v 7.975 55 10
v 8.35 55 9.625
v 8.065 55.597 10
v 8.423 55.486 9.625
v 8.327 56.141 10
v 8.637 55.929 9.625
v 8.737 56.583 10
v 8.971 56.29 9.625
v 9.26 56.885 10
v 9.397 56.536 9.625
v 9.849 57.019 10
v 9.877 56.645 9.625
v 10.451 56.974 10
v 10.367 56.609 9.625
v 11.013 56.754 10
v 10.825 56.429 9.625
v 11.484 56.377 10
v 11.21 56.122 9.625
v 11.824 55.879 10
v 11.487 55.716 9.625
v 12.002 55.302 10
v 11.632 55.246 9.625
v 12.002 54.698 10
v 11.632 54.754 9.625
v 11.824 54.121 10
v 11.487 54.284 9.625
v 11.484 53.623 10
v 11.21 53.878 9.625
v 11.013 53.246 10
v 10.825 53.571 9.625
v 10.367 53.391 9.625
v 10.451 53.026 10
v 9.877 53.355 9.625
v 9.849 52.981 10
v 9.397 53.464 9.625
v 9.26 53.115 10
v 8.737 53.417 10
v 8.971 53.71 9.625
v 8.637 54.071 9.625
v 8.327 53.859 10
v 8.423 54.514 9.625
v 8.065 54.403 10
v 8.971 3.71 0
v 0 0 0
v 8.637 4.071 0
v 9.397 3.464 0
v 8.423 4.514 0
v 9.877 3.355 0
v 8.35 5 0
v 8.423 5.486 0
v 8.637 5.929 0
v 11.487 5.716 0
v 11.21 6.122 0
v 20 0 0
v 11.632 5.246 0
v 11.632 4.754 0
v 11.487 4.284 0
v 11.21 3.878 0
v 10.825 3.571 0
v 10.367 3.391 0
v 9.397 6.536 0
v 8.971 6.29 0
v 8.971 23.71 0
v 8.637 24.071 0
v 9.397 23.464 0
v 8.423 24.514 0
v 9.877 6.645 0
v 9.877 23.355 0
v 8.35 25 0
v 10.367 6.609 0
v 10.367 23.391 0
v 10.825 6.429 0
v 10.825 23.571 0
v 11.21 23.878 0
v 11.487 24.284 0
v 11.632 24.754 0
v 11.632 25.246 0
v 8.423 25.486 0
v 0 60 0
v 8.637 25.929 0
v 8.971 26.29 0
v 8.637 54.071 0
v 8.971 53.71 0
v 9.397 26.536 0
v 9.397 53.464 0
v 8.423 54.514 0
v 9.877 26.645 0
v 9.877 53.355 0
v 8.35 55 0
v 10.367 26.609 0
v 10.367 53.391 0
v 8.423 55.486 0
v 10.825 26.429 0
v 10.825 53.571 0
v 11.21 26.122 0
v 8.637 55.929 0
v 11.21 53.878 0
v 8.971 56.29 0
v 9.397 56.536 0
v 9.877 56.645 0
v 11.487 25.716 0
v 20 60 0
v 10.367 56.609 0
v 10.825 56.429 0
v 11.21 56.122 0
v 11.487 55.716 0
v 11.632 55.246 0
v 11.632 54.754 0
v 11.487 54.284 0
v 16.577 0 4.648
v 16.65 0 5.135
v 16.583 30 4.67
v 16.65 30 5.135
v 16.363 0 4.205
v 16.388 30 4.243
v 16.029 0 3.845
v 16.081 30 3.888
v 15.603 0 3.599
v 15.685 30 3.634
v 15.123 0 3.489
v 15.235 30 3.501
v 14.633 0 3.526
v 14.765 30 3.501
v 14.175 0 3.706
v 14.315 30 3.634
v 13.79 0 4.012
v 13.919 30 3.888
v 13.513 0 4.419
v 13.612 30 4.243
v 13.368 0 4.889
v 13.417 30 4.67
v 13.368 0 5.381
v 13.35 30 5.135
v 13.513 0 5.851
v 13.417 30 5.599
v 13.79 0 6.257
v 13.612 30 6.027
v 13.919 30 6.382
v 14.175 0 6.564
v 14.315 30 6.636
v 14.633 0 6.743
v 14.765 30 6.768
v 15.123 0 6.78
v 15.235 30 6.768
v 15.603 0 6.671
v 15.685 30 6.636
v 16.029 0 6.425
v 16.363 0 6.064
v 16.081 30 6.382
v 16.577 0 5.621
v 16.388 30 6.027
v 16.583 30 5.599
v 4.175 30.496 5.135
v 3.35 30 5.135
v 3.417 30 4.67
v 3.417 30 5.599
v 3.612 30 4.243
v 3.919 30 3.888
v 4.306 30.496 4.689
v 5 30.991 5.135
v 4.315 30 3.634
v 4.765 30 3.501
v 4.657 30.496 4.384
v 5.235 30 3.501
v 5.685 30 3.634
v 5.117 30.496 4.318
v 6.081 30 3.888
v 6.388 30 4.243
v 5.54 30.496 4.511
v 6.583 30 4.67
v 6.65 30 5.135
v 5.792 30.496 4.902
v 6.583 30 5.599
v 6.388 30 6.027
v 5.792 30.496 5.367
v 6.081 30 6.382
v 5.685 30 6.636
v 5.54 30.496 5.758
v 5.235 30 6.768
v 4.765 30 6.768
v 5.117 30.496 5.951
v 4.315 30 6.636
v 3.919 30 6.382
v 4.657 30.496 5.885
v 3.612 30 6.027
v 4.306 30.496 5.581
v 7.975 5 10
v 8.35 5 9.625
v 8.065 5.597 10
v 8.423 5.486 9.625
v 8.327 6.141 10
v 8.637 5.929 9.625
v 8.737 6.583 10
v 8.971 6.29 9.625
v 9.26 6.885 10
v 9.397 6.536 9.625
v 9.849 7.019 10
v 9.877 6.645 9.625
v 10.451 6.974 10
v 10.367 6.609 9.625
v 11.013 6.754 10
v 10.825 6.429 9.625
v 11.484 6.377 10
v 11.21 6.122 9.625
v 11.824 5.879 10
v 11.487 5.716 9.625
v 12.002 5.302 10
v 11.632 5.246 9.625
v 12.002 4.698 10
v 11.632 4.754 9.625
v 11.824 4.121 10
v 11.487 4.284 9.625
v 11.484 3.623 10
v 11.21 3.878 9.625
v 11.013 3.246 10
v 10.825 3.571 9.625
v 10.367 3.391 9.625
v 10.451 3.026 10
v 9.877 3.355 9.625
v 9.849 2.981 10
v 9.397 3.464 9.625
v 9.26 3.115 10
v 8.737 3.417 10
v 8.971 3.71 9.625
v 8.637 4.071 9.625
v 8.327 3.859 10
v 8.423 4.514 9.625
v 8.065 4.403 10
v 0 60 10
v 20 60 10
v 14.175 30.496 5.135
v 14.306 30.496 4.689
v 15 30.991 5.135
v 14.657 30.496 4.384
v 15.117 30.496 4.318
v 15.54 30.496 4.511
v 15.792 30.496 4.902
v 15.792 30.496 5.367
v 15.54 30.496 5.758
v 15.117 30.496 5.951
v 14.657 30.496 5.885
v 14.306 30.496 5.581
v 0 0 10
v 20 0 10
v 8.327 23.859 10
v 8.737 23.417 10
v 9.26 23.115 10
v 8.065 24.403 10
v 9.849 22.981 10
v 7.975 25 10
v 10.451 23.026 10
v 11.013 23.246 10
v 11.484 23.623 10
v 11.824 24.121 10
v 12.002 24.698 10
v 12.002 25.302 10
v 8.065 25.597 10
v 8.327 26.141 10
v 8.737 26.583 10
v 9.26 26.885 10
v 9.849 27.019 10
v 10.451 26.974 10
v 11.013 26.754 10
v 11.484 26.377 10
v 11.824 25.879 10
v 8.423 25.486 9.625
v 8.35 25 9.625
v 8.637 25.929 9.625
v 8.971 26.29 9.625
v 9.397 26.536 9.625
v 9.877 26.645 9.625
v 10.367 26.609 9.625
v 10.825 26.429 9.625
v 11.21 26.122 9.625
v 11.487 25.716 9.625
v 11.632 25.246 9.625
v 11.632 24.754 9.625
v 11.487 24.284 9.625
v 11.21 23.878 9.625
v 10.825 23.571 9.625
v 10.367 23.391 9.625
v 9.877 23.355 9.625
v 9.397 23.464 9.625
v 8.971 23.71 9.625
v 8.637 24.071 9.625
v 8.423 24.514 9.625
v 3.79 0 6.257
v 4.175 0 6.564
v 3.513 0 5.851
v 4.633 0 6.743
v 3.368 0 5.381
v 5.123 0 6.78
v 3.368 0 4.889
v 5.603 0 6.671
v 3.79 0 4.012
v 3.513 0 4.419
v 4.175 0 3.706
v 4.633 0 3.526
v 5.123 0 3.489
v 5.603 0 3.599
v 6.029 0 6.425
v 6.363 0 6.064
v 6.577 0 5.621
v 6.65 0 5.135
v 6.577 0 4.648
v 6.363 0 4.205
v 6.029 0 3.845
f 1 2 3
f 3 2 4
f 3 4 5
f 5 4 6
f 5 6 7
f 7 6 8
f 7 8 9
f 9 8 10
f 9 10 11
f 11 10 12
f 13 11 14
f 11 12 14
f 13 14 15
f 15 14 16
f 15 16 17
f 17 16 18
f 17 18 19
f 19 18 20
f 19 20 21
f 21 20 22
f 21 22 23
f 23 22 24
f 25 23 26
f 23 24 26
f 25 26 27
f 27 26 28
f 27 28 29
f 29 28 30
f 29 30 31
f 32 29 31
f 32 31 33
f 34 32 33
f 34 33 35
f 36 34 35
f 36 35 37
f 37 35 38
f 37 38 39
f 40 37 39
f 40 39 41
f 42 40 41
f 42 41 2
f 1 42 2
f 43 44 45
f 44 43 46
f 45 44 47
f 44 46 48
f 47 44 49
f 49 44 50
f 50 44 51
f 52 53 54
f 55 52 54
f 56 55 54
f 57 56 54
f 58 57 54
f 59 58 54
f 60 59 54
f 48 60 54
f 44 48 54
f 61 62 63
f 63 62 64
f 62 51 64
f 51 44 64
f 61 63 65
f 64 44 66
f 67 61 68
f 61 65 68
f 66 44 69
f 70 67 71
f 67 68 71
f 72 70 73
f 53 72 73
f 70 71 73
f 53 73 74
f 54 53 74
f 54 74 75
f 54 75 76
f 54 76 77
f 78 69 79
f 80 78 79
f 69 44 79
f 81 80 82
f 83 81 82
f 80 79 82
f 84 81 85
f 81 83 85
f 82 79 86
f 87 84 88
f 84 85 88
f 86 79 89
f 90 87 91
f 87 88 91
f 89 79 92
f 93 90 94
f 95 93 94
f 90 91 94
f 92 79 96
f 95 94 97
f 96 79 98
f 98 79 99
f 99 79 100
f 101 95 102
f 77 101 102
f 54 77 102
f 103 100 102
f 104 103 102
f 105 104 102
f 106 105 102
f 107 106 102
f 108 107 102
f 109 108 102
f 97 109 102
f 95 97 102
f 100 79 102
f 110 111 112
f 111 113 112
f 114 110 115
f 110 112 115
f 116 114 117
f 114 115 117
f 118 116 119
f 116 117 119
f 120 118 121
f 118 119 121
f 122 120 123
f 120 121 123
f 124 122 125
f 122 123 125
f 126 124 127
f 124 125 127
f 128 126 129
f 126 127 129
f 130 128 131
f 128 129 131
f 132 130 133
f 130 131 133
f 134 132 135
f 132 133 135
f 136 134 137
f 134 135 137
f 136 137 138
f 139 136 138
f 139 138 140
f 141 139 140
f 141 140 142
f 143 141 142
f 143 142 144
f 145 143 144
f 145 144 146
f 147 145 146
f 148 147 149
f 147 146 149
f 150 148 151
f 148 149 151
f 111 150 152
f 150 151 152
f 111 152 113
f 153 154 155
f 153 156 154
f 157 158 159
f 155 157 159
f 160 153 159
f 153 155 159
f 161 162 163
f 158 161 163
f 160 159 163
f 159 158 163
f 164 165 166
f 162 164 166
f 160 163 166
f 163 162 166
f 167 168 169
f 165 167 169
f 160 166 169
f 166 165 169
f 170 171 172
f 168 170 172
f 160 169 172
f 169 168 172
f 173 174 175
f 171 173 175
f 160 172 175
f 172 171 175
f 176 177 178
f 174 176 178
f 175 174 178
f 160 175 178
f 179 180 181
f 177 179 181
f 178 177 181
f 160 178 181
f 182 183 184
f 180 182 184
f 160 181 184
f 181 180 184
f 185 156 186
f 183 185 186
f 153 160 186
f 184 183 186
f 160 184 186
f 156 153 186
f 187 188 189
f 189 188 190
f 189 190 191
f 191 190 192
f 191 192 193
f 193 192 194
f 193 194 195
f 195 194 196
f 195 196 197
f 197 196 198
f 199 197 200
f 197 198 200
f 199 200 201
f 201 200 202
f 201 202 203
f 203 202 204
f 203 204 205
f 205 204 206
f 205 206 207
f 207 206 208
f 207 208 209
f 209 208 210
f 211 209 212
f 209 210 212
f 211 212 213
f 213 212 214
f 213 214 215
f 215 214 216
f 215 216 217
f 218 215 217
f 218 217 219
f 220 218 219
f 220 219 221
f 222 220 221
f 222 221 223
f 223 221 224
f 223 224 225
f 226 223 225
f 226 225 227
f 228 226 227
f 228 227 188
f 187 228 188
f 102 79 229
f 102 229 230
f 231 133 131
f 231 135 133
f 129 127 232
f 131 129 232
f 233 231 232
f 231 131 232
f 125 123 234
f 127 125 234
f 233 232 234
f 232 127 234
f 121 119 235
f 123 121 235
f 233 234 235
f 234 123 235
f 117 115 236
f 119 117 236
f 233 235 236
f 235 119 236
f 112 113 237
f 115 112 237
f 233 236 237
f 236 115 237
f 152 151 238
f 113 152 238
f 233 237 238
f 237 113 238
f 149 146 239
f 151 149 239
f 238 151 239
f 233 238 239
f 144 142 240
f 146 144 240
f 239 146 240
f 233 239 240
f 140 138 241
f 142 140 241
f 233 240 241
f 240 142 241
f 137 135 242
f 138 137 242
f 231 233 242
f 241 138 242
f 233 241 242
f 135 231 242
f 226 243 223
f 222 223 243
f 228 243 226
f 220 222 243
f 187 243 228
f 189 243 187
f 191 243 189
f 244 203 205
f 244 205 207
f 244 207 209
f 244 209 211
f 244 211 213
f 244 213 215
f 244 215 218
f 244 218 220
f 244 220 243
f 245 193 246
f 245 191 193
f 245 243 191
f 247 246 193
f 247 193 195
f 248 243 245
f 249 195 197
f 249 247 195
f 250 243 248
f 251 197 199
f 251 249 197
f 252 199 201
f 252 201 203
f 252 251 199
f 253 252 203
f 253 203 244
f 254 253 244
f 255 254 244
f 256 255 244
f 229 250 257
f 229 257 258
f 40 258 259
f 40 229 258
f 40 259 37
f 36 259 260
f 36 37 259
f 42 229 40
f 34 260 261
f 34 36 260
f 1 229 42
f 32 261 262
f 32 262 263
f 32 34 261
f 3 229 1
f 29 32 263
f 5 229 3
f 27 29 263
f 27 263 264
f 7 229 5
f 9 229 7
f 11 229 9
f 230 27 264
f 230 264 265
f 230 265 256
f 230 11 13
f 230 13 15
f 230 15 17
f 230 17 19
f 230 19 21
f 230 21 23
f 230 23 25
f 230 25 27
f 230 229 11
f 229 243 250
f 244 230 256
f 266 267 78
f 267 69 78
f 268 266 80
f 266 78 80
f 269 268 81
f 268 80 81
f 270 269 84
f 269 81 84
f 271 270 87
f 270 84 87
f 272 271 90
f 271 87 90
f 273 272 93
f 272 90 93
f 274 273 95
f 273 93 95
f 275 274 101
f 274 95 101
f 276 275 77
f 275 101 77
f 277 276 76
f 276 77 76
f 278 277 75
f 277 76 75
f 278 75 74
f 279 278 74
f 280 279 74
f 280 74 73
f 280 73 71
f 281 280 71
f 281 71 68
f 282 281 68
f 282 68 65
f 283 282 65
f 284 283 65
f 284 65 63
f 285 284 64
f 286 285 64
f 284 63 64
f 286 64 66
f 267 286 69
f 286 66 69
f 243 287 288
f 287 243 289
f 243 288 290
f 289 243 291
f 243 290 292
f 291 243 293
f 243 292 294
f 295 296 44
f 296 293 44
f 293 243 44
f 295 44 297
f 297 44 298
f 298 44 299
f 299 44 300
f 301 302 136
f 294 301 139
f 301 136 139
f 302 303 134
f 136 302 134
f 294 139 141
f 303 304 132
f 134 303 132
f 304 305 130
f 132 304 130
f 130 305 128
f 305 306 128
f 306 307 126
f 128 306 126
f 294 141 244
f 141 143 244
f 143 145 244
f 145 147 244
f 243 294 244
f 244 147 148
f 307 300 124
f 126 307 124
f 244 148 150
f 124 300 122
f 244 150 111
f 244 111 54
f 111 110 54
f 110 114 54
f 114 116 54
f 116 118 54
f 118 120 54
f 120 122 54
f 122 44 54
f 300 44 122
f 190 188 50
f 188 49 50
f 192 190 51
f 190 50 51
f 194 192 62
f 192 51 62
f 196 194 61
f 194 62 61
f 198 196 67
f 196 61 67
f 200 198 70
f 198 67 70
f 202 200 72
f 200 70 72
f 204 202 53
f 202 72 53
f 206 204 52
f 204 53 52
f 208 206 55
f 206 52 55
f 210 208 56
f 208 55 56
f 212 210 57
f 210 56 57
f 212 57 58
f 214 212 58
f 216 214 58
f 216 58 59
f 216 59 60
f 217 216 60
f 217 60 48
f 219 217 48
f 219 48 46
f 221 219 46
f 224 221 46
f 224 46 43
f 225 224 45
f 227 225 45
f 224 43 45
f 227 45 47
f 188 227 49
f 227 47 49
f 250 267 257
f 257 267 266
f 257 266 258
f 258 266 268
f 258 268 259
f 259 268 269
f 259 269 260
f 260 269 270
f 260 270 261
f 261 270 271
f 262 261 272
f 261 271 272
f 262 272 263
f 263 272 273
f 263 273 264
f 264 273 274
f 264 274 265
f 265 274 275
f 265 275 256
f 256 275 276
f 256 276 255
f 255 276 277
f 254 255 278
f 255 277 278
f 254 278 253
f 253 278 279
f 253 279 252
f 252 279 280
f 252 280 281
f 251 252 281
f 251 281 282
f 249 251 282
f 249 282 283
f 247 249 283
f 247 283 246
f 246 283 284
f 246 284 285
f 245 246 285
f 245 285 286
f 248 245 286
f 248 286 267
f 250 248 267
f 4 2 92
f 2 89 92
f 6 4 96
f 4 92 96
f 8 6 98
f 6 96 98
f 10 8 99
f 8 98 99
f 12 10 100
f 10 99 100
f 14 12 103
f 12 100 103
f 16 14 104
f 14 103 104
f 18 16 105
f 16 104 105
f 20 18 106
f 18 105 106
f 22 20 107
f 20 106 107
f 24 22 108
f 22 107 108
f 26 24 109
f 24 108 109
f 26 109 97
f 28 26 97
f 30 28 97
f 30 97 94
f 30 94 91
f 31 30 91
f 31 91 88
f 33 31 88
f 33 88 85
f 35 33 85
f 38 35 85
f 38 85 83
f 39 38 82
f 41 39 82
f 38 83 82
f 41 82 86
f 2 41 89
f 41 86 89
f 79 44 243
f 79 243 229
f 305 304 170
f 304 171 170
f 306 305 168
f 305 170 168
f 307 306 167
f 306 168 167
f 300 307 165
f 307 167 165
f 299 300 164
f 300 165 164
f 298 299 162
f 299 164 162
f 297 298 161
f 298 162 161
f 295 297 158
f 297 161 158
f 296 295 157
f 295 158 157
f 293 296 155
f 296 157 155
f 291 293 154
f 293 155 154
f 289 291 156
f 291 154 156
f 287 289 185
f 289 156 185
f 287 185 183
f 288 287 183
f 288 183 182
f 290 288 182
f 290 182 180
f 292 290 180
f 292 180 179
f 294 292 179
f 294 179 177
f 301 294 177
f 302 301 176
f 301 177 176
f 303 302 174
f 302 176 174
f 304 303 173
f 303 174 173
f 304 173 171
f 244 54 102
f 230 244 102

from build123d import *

# Parameters (mm, degrees)
SKIZZE1_W                          = 20
SKIZZE1_H                          = 60
AUFSATZ_LINEAR_AUSTRAGEN1_DEPTH    = 10
M4X0_7_GEWINDEBOHRUNG2_D           = 3.3
M4X0_7_GEWINDEBOHRUNG2_CSINK_D     = 4.05
M4X0_7_GEWINDEBOHRUNG2_CSINK_ANGLE = 90
M4_GEWINDEBOHRUNG1_D               = 3.3
M4_GEWINDEBOHRUNG1_DEPTH           = 30
M4_GEWINDEBOHRUNG1_TIP             = 0.991420021


with BuildPart() as part:
    # Skizze1 → Aufsatz-Linear austragen1 (new body)
    with BuildSketch(Plane.XY):
        with Locations((10, 30)):
            Rectangle(SKIZZE1_W, SKIZZE1_H)
    extrude(amount=AUFSATZ_LINEAR_AUSTRAGEN1_DEPTH)

    # M4x0.7 Gewindebohrung2 (through all)
    with Locations(Plane.XY.offset(10)):
        with Locations((10, 55), (10, 25), (10, 5)):
            CounterSinkHole(M4X0_7_GEWINDEBOHRUNG2_D / 2, M4X0_7_GEWINDEBOHRUNG2_CSINK_D / 2, counter_sink_angle=M4X0_7_GEWINDEBOHRUNG2_CSINK_ANGLE)

    # M4 Gewindebohrung1
    with Locations(Plane(origin=(0, 0, 0), x_dir=(-1, 0, 0), z_dir=(0, -1, 0))):
        with Locations((-15, -5.134624931), (-5, -5.134624931)):
            Hole(M4_GEWINDEBOHRUNG1_D / 2, depth=M4_GEWINDEBOHRUNG1_DEPTH)
            with Locations((0, 0, -(M4_GEWINDEBOHRUNG1_DEPTH + M4_GEWINDEBOHRUNG1_TIP / 2))):  # 118° drill point
                Cone(0, M4_GEWINDEBOHRUNG1_D / 2, M4_GEWINDEBOHRUNG1_TIP, mode=Mode.SUBTRACT)


solid = part.part
